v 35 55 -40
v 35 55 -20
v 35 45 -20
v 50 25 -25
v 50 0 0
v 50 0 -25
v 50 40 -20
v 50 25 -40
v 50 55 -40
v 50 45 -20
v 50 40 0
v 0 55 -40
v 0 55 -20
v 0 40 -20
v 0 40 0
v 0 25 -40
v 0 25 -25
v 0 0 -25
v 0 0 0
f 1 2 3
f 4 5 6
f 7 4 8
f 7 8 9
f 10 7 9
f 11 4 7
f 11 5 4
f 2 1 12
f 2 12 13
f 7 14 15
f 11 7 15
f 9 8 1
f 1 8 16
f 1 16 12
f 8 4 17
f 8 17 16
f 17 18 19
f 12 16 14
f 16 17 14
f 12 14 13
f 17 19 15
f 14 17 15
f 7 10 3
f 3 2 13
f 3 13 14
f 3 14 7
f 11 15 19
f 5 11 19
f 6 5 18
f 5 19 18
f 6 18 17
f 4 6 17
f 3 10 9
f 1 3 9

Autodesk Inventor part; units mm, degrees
ref_plane "YZ Plane" through (0, 0, 0) normal (1, 0, 0) x (0, 1, 0)
ref_plane "XZ Plane" through (0, 0, 0) normal (0, 1, 0) x (-1, 0, 0)
ref_plane "XY Plane" through (0, 0, 0) normal (0, 0, 1) x (1, 0, 0)
sketch "Náčrt1" plane through (0, 0, 0) normal (1, 0, 0) x (0, 1, 0)
  line L0 (0, 0) -> (0, -25)
  line L1 (0, -25) -> (25, -25)
  line L2 (25, -25) -> (25, -40)
  line L3 (25, -40) -> (55, -40)
  line L4 (55, -40) -> (55, -20)
  line L5 (55, -20) -> (40, -20)
  line L6 (40, -20) -> (40, 0)
  line L7 (40, 0) -> (0, 0)
  dimension "d0" = 25
  dimension "d1" = 25
  dimension "d2" = 15
  dimension "d3" = 30
  dimension "d4" = 20
  dimension "d5" = 15
  dimension "d6" = 20
extrude "Vysunutí1" add sketch "Náčrt1" along normal blind 50
sketch "Náčrt2" plane through (50, 0, 0) normal (1, 0, 0) x (0, 0, -1)
  line L0 (20, 55) -> (20, 40) projected
  line L1 (40, 55) -> (20, 55) projected
  line L2 (20, 45) -> (40, 55)
  line L3 (40, 25) -> (40, 55) projected
  line L4 (40, 55) -> (20, 55)
  point P0 (0, 0)
extrude "Vysunutí2" cut sketch "Náčrt2" against normal blind 15
properties part number "4"
